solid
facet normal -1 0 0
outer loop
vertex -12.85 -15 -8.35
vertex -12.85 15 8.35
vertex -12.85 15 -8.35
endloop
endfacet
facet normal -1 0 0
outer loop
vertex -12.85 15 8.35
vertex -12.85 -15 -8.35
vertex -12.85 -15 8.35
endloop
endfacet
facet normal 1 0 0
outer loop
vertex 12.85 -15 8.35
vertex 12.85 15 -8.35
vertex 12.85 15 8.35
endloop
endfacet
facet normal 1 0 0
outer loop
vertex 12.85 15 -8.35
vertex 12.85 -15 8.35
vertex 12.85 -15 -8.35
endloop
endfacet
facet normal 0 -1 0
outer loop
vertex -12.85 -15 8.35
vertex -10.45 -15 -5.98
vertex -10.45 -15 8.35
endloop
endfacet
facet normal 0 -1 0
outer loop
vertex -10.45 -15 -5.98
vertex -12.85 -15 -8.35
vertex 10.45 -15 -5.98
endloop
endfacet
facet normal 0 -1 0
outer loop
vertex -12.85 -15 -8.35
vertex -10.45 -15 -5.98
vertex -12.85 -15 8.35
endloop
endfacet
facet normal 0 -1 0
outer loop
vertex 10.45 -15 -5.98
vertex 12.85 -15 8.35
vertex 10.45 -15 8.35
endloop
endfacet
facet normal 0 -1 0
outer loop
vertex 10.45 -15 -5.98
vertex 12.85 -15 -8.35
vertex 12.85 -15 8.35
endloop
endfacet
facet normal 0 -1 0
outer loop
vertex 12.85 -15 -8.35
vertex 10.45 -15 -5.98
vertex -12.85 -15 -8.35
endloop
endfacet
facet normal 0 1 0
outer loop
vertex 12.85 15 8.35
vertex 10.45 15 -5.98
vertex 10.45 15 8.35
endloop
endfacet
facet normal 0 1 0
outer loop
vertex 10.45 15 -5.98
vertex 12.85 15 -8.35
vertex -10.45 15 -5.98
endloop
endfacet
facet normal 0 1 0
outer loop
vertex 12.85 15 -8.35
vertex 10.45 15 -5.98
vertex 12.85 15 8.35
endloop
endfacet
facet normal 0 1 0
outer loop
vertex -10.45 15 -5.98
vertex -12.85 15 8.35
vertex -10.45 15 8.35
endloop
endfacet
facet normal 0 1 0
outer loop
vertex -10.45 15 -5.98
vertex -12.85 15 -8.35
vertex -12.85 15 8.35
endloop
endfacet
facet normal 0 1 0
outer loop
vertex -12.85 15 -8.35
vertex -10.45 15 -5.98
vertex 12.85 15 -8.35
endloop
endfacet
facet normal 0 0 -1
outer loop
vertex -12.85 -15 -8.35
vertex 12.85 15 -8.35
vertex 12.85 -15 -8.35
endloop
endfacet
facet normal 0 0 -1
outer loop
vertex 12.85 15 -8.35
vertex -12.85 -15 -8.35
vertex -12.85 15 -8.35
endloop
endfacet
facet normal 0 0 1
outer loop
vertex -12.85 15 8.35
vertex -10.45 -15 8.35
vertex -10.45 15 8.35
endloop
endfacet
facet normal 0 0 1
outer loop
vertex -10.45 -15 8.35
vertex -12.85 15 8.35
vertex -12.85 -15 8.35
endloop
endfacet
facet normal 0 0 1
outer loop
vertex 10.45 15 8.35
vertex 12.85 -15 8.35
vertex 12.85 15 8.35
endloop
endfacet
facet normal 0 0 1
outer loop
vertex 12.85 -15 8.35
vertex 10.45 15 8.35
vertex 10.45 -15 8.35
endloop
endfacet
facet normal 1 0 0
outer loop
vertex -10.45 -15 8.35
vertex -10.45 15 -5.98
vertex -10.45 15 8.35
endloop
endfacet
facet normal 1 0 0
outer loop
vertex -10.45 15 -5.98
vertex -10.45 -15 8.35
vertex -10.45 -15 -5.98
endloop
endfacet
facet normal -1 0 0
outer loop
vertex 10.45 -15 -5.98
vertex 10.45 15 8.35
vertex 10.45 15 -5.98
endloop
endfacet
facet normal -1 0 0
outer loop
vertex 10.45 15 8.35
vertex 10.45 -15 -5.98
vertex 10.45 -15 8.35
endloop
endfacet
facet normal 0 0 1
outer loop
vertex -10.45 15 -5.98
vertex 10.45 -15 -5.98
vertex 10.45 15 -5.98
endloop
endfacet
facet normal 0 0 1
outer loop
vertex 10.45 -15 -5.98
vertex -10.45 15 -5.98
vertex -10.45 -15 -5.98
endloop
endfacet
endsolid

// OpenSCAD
tolerance = .2;

module mountblock_punchout(innerW, innerH, depth) {
  translate([0,-1,1.22]) rotate([90,0,0] )  cube([innerW+tolerance, innerH+tolerance+2.5, depth+2+tolerance], center=true); 
  //translate([0,-1,0]) rotate([90,0,0] )  cube([innerW+tolerance, innerH+tolerance, depth+2+tolerance], center=true); 
}

module mountblock(innerW, innerH, depth) {
  difference() {
    rotate([90,0,0] ) cube([innerW+5, innerH+5, depth], center=true);
    mountblock_punchout(innerW,innerH,depth);
  }
}


mountblock(20.7,11.7,30);
